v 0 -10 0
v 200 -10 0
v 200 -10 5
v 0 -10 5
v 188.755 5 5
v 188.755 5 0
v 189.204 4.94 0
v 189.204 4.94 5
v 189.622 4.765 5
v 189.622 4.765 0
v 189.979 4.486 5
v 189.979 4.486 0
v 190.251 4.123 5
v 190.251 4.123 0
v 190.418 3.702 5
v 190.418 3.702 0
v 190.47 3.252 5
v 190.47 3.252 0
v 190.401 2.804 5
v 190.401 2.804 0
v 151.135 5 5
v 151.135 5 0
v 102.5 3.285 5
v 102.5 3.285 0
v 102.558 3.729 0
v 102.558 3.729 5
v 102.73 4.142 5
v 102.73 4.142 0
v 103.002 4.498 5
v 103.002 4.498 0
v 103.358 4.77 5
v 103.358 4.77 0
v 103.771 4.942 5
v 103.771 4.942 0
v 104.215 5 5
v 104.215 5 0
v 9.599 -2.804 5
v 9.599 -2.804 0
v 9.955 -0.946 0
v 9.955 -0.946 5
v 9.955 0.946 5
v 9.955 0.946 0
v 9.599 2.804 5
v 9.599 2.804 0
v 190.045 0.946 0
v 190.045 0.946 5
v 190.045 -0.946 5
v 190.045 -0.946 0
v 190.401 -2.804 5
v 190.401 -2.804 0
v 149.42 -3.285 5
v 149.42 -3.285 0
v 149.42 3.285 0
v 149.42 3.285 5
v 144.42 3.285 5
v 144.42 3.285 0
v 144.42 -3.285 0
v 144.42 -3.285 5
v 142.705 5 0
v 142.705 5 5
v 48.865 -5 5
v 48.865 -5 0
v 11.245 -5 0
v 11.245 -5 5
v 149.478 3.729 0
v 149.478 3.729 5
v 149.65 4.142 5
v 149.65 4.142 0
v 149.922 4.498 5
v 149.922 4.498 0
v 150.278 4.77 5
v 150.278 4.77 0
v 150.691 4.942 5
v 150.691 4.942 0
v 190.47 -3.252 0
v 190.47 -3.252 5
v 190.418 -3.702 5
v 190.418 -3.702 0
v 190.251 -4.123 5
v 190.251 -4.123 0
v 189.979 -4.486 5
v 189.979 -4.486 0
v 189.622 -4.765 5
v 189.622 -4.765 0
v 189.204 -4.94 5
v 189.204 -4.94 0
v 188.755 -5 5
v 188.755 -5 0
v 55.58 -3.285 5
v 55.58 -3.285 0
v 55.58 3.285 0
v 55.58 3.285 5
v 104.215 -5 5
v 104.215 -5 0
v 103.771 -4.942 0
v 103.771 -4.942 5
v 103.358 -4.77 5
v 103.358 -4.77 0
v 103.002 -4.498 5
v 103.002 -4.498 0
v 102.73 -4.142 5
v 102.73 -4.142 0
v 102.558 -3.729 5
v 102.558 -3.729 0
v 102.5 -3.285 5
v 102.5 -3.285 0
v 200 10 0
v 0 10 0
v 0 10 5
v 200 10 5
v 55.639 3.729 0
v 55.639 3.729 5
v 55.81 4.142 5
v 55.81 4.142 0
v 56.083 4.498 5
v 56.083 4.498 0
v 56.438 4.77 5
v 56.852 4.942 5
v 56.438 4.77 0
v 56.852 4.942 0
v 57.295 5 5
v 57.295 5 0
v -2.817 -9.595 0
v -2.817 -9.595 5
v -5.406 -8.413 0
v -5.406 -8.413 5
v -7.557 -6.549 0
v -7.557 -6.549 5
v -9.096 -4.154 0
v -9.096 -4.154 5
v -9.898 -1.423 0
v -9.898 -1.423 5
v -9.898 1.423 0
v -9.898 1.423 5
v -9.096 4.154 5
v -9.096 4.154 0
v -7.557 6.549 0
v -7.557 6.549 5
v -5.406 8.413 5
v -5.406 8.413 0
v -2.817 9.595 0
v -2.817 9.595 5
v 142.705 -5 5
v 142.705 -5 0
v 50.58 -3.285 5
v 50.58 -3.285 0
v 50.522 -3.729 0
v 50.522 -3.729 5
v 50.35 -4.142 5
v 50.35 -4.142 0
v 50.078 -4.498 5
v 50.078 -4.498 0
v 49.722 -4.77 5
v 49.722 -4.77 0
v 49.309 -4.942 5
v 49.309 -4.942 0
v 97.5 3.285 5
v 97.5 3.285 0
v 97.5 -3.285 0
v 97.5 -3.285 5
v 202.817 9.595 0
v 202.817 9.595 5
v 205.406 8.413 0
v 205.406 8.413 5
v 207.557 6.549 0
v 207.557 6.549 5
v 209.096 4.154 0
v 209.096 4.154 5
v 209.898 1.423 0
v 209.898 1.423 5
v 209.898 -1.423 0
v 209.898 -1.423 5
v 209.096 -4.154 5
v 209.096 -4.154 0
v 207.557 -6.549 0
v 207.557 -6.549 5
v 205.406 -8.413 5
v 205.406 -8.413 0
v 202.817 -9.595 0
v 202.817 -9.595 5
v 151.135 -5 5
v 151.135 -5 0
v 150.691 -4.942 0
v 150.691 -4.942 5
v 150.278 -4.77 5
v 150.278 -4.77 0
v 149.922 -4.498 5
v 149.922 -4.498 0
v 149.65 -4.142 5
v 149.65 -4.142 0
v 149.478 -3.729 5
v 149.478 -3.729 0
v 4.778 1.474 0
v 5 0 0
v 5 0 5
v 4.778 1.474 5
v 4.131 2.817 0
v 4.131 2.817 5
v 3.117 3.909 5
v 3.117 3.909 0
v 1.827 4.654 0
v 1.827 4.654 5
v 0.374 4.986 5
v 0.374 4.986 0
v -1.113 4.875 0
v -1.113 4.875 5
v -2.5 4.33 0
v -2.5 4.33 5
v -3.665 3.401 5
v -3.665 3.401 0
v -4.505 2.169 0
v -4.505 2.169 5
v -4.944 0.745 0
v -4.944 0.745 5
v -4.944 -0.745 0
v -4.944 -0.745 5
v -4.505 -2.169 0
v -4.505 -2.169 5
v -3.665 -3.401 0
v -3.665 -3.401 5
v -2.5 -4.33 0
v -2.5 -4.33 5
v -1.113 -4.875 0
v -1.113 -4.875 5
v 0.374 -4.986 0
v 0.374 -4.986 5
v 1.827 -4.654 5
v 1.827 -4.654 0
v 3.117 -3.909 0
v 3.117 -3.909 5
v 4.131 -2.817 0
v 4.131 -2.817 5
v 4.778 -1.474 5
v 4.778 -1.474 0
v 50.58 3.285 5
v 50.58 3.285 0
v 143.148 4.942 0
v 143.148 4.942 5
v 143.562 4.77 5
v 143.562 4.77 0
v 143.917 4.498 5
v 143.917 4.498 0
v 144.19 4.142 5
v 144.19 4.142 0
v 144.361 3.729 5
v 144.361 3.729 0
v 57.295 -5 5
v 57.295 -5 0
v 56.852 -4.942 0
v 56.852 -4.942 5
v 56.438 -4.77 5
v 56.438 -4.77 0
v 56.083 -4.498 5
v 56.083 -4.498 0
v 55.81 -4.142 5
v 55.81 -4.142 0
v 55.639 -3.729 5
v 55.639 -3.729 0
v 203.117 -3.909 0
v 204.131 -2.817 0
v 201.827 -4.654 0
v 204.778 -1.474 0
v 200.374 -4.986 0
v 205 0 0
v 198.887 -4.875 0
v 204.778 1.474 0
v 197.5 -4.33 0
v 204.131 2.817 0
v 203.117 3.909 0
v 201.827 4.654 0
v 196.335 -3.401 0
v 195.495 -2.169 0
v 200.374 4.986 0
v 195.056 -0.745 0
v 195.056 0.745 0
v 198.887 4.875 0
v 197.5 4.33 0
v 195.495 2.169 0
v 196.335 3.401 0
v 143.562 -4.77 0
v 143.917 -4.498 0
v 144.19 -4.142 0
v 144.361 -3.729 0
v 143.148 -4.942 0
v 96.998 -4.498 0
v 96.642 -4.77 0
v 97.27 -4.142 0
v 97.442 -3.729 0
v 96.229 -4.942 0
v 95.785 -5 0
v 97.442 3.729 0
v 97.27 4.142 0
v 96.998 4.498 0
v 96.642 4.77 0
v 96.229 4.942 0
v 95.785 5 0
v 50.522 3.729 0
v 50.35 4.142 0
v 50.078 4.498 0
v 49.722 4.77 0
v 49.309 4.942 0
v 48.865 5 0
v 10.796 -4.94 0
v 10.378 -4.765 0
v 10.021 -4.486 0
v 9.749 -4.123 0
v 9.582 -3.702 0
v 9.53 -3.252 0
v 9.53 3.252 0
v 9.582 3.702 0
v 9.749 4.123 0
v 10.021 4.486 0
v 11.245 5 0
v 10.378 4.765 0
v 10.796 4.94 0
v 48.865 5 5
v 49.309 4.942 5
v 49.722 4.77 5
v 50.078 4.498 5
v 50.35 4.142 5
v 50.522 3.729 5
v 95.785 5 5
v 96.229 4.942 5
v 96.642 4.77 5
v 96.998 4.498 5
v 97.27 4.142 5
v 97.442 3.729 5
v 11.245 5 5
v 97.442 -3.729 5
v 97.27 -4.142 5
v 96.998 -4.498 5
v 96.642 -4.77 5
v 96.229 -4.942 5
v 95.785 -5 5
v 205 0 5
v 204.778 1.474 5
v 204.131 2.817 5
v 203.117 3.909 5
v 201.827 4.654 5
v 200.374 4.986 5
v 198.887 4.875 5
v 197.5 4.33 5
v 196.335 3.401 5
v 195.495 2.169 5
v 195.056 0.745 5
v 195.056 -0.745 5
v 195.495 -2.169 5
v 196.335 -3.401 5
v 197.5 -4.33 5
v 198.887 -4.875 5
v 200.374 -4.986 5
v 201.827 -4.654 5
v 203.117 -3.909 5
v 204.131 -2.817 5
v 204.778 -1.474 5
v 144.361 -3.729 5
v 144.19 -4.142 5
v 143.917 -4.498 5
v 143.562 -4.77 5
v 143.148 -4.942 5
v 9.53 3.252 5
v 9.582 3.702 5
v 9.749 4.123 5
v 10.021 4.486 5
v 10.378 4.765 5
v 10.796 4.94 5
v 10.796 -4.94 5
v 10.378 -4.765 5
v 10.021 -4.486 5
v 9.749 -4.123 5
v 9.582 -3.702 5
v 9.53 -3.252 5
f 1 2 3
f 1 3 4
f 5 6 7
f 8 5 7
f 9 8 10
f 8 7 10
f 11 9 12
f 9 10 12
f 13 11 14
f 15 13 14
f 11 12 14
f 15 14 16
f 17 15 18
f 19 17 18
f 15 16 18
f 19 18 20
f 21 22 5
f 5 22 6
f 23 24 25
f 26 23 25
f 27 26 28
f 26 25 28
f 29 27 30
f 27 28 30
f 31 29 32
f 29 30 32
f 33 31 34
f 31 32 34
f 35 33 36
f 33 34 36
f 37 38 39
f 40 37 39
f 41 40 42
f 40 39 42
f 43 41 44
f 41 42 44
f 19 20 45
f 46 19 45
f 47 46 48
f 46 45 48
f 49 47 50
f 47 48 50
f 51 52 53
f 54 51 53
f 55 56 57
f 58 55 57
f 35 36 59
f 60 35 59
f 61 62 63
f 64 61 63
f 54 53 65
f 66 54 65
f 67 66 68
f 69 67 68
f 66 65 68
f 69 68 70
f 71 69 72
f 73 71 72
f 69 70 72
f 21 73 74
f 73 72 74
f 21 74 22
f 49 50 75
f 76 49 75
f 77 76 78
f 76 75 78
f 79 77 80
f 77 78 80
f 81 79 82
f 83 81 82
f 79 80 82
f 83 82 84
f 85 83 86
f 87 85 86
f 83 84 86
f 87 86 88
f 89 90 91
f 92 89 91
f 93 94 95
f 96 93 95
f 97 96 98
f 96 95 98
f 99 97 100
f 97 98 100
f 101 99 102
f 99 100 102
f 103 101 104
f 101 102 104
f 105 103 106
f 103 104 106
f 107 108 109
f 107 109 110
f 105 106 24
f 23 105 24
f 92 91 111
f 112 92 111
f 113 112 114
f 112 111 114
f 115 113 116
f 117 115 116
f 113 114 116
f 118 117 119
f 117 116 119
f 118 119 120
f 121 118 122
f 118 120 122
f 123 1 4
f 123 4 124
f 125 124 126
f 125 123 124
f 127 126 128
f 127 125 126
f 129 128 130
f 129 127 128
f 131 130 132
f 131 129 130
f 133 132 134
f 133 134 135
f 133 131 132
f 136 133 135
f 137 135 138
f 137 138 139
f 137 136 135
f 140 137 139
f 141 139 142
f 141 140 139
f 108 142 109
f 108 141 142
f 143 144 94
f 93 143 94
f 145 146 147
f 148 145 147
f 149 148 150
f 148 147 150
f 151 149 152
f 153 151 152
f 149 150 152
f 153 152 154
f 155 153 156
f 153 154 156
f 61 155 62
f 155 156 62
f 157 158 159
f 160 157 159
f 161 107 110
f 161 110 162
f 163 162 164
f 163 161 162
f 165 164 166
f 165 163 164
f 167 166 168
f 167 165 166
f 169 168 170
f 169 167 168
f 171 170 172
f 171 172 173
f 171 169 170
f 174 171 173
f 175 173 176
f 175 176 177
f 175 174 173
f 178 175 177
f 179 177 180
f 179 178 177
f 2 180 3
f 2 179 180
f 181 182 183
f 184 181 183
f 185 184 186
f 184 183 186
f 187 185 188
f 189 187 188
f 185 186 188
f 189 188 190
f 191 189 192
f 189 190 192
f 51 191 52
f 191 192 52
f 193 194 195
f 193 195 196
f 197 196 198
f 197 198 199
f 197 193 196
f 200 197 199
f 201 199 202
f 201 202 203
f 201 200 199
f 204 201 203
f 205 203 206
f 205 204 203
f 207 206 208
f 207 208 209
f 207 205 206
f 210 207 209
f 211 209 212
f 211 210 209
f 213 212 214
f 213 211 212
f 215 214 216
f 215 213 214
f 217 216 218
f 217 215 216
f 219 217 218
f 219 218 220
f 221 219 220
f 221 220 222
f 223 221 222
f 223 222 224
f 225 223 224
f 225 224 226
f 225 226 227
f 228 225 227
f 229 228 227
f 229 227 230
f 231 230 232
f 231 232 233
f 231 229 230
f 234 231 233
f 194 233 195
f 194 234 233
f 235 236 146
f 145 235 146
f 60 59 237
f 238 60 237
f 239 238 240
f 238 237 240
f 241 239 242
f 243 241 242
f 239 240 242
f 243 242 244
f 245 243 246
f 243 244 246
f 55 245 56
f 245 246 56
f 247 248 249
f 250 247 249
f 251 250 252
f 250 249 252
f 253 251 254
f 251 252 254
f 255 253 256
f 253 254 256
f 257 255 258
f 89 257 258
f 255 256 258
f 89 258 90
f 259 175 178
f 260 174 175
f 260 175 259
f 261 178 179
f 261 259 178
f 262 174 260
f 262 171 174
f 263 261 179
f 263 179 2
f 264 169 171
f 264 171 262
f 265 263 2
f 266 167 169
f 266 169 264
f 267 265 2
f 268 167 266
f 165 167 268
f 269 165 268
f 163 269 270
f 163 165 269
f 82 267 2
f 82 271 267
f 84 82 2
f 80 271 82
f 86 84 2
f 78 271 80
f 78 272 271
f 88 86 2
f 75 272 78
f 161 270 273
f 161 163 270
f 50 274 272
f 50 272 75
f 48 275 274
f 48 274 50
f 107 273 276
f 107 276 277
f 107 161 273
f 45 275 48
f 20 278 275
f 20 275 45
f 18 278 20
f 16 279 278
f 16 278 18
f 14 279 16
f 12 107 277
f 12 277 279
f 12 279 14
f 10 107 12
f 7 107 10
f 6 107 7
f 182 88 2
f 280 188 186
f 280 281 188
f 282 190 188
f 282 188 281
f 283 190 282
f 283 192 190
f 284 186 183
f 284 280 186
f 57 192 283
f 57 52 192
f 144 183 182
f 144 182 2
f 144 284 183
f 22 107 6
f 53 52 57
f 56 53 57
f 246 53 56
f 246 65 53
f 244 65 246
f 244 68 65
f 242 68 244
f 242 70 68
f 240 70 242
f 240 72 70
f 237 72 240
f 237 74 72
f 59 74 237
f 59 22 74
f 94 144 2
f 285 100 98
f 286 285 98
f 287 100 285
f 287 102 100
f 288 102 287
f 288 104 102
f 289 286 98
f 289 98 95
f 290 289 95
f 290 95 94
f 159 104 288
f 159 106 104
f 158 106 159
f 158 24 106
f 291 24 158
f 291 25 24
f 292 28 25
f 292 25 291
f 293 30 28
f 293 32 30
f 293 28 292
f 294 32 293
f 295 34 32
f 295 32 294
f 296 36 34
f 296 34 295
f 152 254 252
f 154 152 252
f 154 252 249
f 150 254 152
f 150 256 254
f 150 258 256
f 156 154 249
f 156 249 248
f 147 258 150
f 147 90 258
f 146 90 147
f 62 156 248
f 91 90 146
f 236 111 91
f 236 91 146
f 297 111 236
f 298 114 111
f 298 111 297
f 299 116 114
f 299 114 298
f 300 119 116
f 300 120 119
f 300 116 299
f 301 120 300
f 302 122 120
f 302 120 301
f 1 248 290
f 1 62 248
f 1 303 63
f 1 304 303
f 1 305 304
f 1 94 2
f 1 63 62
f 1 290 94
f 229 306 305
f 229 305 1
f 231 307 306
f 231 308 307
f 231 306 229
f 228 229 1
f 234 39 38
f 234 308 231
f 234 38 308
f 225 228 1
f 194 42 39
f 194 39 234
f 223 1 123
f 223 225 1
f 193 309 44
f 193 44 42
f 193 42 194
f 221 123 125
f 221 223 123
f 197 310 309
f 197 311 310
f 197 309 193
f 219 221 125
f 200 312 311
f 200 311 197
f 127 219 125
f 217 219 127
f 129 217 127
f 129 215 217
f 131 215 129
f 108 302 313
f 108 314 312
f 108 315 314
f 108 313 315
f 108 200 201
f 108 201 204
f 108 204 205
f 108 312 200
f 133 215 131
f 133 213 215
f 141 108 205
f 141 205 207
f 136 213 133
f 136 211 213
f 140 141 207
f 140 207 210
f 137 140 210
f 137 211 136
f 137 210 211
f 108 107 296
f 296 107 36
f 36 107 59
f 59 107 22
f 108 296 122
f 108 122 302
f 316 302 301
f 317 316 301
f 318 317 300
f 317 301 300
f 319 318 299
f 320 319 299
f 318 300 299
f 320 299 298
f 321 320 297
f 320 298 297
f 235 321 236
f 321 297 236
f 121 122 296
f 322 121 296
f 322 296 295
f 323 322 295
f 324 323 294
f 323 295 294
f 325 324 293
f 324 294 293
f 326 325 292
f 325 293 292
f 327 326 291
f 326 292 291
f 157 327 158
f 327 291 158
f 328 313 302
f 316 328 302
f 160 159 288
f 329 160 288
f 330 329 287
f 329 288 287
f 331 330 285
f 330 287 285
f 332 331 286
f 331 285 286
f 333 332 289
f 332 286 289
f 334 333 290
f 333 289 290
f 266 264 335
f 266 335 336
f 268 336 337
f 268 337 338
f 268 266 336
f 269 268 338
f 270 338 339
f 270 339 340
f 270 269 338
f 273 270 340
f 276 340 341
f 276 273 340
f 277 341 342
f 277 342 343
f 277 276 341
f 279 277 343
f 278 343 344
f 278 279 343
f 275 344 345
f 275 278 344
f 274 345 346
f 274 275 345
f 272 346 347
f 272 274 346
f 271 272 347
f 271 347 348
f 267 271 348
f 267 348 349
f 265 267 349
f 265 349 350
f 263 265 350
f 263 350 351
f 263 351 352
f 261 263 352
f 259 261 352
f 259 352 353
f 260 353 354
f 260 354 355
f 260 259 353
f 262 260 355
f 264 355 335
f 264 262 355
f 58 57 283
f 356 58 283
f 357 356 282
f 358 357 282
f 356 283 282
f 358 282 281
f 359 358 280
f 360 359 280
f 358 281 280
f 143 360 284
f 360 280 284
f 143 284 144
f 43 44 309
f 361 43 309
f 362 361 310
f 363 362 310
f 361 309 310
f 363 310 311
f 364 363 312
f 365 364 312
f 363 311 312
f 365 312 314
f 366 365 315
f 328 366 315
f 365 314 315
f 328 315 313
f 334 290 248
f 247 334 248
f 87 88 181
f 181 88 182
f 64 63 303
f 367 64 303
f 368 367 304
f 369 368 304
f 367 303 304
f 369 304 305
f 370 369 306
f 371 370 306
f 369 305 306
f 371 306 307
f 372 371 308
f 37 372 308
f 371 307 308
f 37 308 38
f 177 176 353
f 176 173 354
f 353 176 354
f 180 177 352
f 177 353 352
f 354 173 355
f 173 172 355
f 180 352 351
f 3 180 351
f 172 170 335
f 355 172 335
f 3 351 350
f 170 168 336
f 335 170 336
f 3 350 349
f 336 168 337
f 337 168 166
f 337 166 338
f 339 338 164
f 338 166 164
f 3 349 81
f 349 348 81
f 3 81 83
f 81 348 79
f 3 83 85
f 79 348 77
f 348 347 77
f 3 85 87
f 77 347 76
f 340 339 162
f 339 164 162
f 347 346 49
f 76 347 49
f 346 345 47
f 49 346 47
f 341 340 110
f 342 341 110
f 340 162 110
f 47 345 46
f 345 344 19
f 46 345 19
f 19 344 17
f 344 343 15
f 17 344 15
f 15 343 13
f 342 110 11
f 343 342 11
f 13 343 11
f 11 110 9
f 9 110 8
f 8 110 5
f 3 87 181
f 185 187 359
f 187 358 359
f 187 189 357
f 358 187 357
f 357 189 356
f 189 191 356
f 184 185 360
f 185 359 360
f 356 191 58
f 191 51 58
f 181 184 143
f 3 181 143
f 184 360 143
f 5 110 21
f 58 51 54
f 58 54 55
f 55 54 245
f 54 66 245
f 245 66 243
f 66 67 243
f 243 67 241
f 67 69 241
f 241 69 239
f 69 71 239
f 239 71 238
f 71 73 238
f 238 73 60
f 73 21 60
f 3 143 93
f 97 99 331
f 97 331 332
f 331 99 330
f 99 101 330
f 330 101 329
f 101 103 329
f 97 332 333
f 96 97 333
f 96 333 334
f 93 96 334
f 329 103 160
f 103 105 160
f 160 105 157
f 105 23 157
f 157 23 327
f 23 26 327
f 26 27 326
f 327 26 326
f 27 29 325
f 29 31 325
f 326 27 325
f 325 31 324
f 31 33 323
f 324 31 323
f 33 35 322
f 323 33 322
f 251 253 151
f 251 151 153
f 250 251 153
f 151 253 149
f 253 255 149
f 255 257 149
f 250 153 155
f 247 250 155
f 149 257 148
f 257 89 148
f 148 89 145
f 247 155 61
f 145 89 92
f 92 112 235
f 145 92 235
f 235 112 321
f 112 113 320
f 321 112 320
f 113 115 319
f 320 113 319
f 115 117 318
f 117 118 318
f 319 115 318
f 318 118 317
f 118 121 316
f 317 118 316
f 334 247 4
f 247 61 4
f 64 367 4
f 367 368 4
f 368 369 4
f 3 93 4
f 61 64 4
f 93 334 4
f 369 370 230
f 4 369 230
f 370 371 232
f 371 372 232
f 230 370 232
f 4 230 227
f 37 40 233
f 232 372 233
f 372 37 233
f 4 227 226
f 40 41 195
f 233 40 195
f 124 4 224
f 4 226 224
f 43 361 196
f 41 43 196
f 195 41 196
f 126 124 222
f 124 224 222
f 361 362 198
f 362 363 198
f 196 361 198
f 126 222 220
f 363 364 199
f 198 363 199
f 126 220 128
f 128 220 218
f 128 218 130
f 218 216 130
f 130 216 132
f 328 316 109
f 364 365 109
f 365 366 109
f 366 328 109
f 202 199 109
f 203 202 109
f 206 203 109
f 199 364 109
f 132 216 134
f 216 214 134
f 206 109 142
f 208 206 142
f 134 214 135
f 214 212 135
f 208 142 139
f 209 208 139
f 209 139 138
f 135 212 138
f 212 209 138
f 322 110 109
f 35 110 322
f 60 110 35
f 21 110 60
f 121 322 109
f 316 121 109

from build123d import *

# Parameters (mm, degrees)
SKETCH_1_R      = 5
EXTRUDE_1_DEPTH = 5


with BuildPart() as part:
    # 草图1 → 凸台-拉伸1 (new body)
    with BuildSketch(Plane.XY):
        with BuildLine():
            Line((0, 10), (200, 10))
            ThreePointArc((200, 10), (210, 0), (200, -10))
            Line((200, -10), (0, -10))
            ThreePointArc((0, -10), (-10, 0), (0, 10))
        make_face()
        Circle(SKETCH_1_R, mode=Mode.SUBTRACT)
        with Locations((200, 0)):
            Circle(SKETCH_1_R, mode=Mode.SUBTRACT)
        with BuildLine():
            Line((11.245449786, 5), (48.864788989, 5))
            ThreePointArc((48.864788989, 5), (50.077716142, 4.497589123), (50.580127019, 3.28466197))
            Line((50.580127019, 3.28466197), (50.580127019, 0))
            Line((50.580127019, 0), (50.580127019, -3.28466197))
            ThreePointArc((50.580127019, -3.28466197), (50.077716142, -4.497589123), (48.864788989, -5))
            Line((48.864788989, -5), (11.245449786, -5))
            ThreePointArc((11.245449786, -5), (9.872979547, -4.313598314), (9.59891192, -2.803727867))
            ThreePointArc((9.59891192, -2.803727867), (10, 0), (9.59891192, 2.803727867))
            ThreePointArc((9.59891192, 2.803727867), (9.872979547, 4.313598314), (11.245449786, 5))
        make_face(mode=Mode.SUBTRACT)
        with BuildLine():
            Line((188.754550214, -5), (151.135211011, -5))
            ThreePointArc((151.135211011, -5), (149.922283858, -4.497589123), (149.419872981, -3.28466197))
            Line((149.419872981, -3.28466197), (149.419872981, 0))
            Line((149.419872981, 0), (149.419872981, 3.28466197))
            ThreePointArc((149.419872981, 3.28466197), (149.922283858, 4.497589123), (151.135211011, 5))
            Line((151.135211011, 5), (188.754550214, 5))
            ThreePointArc((188.754550214, 5), (190.127020453, 4.313598314), (190.40108808, 2.803727867))
            ThreePointArc((190.40108808, 2.803727867), (190, 0), (190.40108808, -2.803727867))
            ThreePointArc((190.40108808, -2.803727867), (190.127020453, -4.313598314), (188.754550214, -5))
        make_face(mode=Mode.SUBTRACT)
        with BuildLine():
            Line((104.21533803, 5), (142.704534951, 5))
            ThreePointArc((142.704534951, 5), (143.917462104, 4.497589123), (144.419872981, 3.28466197))
            Line((144.419872981, 3.28466197), (144.419872981, 0))
            Line((144.419872981, 0), (144.419872981, -3.28466197))
            ThreePointArc((144.419872981, -3.28466197), (143.917462104, -4.497589123), (142.704534951, -5))
            Line((142.704534951, -5), (104.21533803, -5))
            ThreePointArc((104.21533803, -5), (103.002410877, -4.497589123), (102.5, -3.28466197))
            Line((102.5, -3.28466197), (102.5, 0))
            Line((102.5, 0), (102.5, 3.28466197))
            ThreePointArc((102.5, 3.28466197), (103.002410877, 4.497589123), (104.21533803, 5))
        make_face(mode=Mode.SUBTRACT)
        with BuildLine():
            Line((95.78466197, -5), (57.295465049, -5))
            ThreePointArc((57.295465049, -5), (56.082537896, -4.497589123), (55.580127019, -3.28466197))
            Line((55.580127019, -3.28466197), (55.580127019, 0))
            Line((55.580127019, 0), (55.580127019, 3.28466197))
            ThreePointArc((55.580127019, 3.28466197), (56.082537896, 4.497589123), (57.295465049, 5))
            Line((57.295465049, 5), (95.78466197, 5))
            ThreePointArc((95.78466197, 5), (96.997589123, 4.497589123), (97.5, 3.28466197))
            Line((97.5, 3.28466197), (97.5, 0))
            Line((97.5, 0), (97.5, -3.28466197))
            ThreePointArc((97.5, -3.28466197), (96.997589123, -4.497589123), (95.78466197, -5))
        make_face(mode=Mode.SUBTRACT)
    extrude(amount=EXTRUDE_1_DEPTH)


solid = part.part
